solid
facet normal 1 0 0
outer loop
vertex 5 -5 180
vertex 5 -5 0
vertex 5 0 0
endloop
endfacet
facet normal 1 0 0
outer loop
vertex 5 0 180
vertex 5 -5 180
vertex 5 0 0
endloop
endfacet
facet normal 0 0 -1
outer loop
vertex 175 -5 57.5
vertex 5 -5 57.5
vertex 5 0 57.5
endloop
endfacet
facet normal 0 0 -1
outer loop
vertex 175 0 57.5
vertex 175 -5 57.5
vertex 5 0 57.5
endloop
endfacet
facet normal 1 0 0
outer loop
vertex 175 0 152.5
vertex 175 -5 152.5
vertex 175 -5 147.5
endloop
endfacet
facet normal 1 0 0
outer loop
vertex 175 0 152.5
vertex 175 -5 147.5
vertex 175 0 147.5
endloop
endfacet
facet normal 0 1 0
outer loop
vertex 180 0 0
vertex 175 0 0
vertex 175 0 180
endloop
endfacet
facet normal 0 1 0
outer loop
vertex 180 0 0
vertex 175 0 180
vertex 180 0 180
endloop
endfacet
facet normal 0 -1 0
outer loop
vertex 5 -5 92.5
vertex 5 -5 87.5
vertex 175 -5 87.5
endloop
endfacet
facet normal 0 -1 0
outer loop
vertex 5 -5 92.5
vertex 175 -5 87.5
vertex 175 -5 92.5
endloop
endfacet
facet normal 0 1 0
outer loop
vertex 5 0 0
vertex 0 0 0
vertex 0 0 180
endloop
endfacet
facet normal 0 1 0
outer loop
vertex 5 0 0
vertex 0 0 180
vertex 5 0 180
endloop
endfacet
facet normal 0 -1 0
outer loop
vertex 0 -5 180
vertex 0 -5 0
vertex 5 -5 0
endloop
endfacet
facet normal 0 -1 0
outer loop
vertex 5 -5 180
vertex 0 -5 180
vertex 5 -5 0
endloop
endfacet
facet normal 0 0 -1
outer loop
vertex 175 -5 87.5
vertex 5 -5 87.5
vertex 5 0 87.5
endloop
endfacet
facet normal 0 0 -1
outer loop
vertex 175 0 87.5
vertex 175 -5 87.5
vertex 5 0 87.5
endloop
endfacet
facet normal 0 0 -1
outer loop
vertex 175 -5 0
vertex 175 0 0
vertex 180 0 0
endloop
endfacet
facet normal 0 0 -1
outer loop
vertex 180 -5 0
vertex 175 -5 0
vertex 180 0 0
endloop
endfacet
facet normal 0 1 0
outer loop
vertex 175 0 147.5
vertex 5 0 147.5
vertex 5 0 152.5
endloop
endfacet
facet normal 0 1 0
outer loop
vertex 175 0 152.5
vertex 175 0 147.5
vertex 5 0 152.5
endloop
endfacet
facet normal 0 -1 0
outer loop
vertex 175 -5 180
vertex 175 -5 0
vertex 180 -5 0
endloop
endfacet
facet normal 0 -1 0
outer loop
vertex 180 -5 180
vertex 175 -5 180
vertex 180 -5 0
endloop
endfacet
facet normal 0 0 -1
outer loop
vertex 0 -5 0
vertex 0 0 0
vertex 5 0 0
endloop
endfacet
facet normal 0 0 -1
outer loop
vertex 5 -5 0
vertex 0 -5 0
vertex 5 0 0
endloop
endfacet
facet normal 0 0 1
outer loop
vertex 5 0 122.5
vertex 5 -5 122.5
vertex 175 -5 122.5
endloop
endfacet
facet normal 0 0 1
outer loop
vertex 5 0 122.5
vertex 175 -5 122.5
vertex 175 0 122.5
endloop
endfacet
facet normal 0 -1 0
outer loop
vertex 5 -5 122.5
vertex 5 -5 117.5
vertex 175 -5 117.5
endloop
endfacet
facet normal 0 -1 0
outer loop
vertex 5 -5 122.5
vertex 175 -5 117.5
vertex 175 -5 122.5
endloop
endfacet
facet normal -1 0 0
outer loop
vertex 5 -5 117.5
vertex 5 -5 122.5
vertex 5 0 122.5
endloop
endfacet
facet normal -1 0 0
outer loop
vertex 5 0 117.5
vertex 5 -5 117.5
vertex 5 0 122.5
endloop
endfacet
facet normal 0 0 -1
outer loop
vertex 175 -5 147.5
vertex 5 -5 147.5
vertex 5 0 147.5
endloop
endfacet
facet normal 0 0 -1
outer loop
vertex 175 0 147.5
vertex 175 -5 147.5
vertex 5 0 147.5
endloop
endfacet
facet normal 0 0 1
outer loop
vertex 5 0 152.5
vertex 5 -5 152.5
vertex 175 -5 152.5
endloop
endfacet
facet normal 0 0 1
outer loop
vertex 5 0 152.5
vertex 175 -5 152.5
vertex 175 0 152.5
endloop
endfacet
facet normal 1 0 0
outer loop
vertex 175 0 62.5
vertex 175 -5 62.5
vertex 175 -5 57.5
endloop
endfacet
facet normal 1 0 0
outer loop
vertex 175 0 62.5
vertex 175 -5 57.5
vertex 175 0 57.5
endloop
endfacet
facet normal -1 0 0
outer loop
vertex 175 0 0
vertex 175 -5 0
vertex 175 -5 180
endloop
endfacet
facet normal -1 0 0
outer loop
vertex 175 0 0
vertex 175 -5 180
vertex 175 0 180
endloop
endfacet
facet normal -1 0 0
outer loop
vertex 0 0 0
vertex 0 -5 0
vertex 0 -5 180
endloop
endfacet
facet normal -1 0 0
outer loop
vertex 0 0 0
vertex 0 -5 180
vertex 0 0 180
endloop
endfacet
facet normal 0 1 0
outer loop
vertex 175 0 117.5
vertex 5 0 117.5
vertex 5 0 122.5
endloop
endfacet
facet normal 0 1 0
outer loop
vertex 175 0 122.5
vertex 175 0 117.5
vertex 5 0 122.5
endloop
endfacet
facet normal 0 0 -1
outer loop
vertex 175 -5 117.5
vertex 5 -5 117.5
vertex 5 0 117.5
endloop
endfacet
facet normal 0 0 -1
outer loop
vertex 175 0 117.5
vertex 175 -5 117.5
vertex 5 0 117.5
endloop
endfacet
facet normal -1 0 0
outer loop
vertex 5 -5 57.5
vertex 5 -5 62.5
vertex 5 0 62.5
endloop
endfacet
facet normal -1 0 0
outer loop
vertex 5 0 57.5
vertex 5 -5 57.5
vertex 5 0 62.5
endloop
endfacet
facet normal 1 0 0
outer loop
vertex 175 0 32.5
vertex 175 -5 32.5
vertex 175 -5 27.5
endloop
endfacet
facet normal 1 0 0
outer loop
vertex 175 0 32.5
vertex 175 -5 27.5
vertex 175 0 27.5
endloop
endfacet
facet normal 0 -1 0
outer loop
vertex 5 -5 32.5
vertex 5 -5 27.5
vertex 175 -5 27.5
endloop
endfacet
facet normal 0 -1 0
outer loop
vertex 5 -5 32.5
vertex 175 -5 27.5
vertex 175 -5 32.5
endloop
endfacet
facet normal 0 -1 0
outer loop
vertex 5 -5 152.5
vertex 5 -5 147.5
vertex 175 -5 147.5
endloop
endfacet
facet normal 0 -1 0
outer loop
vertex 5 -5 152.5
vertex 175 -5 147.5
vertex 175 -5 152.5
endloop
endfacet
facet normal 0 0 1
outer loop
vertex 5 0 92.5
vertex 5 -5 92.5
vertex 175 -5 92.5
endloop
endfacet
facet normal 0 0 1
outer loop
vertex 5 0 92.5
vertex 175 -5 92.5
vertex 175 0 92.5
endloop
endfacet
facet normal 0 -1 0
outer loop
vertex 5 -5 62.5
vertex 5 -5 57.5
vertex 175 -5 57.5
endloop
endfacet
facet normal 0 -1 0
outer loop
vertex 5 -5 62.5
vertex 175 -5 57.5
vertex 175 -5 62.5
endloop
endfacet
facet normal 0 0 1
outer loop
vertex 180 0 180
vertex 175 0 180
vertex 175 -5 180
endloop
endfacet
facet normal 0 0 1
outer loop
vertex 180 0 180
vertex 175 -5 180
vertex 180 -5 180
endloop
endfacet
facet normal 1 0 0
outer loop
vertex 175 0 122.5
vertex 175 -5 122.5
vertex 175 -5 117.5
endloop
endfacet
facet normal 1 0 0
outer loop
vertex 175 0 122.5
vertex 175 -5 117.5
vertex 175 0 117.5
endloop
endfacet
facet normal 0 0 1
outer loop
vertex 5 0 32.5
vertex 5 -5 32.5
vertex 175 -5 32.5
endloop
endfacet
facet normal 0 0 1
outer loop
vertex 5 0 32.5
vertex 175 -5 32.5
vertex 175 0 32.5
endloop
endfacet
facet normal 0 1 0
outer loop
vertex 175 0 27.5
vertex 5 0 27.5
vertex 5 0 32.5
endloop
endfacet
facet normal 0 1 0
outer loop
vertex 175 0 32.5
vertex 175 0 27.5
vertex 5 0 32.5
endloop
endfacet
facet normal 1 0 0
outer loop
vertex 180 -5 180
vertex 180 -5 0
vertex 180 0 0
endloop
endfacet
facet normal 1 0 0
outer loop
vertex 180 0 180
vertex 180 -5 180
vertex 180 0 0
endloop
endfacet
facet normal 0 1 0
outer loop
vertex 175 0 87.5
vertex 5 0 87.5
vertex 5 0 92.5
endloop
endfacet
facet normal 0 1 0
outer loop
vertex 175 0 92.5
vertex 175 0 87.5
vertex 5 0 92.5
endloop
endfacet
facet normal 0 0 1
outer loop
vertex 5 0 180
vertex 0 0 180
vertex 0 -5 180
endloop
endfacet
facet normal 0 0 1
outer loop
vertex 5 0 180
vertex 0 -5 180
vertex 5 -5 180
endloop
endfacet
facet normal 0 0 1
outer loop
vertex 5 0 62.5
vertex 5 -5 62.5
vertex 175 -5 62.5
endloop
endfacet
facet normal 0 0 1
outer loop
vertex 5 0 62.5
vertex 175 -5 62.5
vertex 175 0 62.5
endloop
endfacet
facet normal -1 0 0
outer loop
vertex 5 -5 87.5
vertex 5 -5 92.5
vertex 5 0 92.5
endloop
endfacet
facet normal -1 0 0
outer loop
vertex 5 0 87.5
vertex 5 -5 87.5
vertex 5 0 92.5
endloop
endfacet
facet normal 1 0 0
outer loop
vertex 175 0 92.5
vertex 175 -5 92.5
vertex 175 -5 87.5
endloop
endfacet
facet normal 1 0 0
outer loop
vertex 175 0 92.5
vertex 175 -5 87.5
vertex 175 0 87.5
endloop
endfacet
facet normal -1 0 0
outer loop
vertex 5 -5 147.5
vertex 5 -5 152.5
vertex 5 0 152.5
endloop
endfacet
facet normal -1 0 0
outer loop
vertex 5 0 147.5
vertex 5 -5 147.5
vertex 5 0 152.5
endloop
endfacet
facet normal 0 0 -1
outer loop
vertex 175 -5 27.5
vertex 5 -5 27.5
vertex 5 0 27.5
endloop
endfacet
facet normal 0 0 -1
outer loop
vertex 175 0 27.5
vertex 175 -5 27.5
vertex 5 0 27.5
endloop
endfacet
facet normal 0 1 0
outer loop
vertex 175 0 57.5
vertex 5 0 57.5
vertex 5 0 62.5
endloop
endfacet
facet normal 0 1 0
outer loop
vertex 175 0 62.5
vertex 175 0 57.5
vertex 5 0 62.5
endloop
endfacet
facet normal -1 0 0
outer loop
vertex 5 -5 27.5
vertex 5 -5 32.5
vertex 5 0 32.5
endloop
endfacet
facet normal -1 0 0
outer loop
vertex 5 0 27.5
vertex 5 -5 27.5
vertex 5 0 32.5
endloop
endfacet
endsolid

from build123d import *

# Parameters (mm, degrees)
F0_W     = 5
F0_H     = 5
F1_DEPTH = 180
F2_W     = 5
F2_H     = 5
F3_DEPTH = 170


with BuildPart() as f1:
    # F0 (on Top) → F1 (new body)
    with BuildSketch(Plane.XY):
        with Locations((2.5, -2.5)):
            Rectangle(F0_W, F0_H)
        with Locations((177.5, -2.5)):
            Rectangle(F0_W, F0_H)
    extrude(amount=F1_DEPTH)


with BuildPart() as f3:
    # F2 (on face) → F3 (new body)
    with BuildSketch(Plane.YZ.offset(5)):
        with Locations((-2.5, 30)):
            Rectangle(F2_W, F2_H)
        with Locations((-2.5, 60)):
            Rectangle(F2_W, F2_H)
        with Locations((-2.5, 90)):
            Rectangle(F2_W, F2_H)
        with Locations((-2.5, 120)):
            Rectangle(F2_W, F2_H)
        with Locations((-2.5, 150)):
            Rectangle(F2_W, F2_H)
    extrude(amount=F3_DEPTH)


solid = Compound([f1.part, f3.part])
